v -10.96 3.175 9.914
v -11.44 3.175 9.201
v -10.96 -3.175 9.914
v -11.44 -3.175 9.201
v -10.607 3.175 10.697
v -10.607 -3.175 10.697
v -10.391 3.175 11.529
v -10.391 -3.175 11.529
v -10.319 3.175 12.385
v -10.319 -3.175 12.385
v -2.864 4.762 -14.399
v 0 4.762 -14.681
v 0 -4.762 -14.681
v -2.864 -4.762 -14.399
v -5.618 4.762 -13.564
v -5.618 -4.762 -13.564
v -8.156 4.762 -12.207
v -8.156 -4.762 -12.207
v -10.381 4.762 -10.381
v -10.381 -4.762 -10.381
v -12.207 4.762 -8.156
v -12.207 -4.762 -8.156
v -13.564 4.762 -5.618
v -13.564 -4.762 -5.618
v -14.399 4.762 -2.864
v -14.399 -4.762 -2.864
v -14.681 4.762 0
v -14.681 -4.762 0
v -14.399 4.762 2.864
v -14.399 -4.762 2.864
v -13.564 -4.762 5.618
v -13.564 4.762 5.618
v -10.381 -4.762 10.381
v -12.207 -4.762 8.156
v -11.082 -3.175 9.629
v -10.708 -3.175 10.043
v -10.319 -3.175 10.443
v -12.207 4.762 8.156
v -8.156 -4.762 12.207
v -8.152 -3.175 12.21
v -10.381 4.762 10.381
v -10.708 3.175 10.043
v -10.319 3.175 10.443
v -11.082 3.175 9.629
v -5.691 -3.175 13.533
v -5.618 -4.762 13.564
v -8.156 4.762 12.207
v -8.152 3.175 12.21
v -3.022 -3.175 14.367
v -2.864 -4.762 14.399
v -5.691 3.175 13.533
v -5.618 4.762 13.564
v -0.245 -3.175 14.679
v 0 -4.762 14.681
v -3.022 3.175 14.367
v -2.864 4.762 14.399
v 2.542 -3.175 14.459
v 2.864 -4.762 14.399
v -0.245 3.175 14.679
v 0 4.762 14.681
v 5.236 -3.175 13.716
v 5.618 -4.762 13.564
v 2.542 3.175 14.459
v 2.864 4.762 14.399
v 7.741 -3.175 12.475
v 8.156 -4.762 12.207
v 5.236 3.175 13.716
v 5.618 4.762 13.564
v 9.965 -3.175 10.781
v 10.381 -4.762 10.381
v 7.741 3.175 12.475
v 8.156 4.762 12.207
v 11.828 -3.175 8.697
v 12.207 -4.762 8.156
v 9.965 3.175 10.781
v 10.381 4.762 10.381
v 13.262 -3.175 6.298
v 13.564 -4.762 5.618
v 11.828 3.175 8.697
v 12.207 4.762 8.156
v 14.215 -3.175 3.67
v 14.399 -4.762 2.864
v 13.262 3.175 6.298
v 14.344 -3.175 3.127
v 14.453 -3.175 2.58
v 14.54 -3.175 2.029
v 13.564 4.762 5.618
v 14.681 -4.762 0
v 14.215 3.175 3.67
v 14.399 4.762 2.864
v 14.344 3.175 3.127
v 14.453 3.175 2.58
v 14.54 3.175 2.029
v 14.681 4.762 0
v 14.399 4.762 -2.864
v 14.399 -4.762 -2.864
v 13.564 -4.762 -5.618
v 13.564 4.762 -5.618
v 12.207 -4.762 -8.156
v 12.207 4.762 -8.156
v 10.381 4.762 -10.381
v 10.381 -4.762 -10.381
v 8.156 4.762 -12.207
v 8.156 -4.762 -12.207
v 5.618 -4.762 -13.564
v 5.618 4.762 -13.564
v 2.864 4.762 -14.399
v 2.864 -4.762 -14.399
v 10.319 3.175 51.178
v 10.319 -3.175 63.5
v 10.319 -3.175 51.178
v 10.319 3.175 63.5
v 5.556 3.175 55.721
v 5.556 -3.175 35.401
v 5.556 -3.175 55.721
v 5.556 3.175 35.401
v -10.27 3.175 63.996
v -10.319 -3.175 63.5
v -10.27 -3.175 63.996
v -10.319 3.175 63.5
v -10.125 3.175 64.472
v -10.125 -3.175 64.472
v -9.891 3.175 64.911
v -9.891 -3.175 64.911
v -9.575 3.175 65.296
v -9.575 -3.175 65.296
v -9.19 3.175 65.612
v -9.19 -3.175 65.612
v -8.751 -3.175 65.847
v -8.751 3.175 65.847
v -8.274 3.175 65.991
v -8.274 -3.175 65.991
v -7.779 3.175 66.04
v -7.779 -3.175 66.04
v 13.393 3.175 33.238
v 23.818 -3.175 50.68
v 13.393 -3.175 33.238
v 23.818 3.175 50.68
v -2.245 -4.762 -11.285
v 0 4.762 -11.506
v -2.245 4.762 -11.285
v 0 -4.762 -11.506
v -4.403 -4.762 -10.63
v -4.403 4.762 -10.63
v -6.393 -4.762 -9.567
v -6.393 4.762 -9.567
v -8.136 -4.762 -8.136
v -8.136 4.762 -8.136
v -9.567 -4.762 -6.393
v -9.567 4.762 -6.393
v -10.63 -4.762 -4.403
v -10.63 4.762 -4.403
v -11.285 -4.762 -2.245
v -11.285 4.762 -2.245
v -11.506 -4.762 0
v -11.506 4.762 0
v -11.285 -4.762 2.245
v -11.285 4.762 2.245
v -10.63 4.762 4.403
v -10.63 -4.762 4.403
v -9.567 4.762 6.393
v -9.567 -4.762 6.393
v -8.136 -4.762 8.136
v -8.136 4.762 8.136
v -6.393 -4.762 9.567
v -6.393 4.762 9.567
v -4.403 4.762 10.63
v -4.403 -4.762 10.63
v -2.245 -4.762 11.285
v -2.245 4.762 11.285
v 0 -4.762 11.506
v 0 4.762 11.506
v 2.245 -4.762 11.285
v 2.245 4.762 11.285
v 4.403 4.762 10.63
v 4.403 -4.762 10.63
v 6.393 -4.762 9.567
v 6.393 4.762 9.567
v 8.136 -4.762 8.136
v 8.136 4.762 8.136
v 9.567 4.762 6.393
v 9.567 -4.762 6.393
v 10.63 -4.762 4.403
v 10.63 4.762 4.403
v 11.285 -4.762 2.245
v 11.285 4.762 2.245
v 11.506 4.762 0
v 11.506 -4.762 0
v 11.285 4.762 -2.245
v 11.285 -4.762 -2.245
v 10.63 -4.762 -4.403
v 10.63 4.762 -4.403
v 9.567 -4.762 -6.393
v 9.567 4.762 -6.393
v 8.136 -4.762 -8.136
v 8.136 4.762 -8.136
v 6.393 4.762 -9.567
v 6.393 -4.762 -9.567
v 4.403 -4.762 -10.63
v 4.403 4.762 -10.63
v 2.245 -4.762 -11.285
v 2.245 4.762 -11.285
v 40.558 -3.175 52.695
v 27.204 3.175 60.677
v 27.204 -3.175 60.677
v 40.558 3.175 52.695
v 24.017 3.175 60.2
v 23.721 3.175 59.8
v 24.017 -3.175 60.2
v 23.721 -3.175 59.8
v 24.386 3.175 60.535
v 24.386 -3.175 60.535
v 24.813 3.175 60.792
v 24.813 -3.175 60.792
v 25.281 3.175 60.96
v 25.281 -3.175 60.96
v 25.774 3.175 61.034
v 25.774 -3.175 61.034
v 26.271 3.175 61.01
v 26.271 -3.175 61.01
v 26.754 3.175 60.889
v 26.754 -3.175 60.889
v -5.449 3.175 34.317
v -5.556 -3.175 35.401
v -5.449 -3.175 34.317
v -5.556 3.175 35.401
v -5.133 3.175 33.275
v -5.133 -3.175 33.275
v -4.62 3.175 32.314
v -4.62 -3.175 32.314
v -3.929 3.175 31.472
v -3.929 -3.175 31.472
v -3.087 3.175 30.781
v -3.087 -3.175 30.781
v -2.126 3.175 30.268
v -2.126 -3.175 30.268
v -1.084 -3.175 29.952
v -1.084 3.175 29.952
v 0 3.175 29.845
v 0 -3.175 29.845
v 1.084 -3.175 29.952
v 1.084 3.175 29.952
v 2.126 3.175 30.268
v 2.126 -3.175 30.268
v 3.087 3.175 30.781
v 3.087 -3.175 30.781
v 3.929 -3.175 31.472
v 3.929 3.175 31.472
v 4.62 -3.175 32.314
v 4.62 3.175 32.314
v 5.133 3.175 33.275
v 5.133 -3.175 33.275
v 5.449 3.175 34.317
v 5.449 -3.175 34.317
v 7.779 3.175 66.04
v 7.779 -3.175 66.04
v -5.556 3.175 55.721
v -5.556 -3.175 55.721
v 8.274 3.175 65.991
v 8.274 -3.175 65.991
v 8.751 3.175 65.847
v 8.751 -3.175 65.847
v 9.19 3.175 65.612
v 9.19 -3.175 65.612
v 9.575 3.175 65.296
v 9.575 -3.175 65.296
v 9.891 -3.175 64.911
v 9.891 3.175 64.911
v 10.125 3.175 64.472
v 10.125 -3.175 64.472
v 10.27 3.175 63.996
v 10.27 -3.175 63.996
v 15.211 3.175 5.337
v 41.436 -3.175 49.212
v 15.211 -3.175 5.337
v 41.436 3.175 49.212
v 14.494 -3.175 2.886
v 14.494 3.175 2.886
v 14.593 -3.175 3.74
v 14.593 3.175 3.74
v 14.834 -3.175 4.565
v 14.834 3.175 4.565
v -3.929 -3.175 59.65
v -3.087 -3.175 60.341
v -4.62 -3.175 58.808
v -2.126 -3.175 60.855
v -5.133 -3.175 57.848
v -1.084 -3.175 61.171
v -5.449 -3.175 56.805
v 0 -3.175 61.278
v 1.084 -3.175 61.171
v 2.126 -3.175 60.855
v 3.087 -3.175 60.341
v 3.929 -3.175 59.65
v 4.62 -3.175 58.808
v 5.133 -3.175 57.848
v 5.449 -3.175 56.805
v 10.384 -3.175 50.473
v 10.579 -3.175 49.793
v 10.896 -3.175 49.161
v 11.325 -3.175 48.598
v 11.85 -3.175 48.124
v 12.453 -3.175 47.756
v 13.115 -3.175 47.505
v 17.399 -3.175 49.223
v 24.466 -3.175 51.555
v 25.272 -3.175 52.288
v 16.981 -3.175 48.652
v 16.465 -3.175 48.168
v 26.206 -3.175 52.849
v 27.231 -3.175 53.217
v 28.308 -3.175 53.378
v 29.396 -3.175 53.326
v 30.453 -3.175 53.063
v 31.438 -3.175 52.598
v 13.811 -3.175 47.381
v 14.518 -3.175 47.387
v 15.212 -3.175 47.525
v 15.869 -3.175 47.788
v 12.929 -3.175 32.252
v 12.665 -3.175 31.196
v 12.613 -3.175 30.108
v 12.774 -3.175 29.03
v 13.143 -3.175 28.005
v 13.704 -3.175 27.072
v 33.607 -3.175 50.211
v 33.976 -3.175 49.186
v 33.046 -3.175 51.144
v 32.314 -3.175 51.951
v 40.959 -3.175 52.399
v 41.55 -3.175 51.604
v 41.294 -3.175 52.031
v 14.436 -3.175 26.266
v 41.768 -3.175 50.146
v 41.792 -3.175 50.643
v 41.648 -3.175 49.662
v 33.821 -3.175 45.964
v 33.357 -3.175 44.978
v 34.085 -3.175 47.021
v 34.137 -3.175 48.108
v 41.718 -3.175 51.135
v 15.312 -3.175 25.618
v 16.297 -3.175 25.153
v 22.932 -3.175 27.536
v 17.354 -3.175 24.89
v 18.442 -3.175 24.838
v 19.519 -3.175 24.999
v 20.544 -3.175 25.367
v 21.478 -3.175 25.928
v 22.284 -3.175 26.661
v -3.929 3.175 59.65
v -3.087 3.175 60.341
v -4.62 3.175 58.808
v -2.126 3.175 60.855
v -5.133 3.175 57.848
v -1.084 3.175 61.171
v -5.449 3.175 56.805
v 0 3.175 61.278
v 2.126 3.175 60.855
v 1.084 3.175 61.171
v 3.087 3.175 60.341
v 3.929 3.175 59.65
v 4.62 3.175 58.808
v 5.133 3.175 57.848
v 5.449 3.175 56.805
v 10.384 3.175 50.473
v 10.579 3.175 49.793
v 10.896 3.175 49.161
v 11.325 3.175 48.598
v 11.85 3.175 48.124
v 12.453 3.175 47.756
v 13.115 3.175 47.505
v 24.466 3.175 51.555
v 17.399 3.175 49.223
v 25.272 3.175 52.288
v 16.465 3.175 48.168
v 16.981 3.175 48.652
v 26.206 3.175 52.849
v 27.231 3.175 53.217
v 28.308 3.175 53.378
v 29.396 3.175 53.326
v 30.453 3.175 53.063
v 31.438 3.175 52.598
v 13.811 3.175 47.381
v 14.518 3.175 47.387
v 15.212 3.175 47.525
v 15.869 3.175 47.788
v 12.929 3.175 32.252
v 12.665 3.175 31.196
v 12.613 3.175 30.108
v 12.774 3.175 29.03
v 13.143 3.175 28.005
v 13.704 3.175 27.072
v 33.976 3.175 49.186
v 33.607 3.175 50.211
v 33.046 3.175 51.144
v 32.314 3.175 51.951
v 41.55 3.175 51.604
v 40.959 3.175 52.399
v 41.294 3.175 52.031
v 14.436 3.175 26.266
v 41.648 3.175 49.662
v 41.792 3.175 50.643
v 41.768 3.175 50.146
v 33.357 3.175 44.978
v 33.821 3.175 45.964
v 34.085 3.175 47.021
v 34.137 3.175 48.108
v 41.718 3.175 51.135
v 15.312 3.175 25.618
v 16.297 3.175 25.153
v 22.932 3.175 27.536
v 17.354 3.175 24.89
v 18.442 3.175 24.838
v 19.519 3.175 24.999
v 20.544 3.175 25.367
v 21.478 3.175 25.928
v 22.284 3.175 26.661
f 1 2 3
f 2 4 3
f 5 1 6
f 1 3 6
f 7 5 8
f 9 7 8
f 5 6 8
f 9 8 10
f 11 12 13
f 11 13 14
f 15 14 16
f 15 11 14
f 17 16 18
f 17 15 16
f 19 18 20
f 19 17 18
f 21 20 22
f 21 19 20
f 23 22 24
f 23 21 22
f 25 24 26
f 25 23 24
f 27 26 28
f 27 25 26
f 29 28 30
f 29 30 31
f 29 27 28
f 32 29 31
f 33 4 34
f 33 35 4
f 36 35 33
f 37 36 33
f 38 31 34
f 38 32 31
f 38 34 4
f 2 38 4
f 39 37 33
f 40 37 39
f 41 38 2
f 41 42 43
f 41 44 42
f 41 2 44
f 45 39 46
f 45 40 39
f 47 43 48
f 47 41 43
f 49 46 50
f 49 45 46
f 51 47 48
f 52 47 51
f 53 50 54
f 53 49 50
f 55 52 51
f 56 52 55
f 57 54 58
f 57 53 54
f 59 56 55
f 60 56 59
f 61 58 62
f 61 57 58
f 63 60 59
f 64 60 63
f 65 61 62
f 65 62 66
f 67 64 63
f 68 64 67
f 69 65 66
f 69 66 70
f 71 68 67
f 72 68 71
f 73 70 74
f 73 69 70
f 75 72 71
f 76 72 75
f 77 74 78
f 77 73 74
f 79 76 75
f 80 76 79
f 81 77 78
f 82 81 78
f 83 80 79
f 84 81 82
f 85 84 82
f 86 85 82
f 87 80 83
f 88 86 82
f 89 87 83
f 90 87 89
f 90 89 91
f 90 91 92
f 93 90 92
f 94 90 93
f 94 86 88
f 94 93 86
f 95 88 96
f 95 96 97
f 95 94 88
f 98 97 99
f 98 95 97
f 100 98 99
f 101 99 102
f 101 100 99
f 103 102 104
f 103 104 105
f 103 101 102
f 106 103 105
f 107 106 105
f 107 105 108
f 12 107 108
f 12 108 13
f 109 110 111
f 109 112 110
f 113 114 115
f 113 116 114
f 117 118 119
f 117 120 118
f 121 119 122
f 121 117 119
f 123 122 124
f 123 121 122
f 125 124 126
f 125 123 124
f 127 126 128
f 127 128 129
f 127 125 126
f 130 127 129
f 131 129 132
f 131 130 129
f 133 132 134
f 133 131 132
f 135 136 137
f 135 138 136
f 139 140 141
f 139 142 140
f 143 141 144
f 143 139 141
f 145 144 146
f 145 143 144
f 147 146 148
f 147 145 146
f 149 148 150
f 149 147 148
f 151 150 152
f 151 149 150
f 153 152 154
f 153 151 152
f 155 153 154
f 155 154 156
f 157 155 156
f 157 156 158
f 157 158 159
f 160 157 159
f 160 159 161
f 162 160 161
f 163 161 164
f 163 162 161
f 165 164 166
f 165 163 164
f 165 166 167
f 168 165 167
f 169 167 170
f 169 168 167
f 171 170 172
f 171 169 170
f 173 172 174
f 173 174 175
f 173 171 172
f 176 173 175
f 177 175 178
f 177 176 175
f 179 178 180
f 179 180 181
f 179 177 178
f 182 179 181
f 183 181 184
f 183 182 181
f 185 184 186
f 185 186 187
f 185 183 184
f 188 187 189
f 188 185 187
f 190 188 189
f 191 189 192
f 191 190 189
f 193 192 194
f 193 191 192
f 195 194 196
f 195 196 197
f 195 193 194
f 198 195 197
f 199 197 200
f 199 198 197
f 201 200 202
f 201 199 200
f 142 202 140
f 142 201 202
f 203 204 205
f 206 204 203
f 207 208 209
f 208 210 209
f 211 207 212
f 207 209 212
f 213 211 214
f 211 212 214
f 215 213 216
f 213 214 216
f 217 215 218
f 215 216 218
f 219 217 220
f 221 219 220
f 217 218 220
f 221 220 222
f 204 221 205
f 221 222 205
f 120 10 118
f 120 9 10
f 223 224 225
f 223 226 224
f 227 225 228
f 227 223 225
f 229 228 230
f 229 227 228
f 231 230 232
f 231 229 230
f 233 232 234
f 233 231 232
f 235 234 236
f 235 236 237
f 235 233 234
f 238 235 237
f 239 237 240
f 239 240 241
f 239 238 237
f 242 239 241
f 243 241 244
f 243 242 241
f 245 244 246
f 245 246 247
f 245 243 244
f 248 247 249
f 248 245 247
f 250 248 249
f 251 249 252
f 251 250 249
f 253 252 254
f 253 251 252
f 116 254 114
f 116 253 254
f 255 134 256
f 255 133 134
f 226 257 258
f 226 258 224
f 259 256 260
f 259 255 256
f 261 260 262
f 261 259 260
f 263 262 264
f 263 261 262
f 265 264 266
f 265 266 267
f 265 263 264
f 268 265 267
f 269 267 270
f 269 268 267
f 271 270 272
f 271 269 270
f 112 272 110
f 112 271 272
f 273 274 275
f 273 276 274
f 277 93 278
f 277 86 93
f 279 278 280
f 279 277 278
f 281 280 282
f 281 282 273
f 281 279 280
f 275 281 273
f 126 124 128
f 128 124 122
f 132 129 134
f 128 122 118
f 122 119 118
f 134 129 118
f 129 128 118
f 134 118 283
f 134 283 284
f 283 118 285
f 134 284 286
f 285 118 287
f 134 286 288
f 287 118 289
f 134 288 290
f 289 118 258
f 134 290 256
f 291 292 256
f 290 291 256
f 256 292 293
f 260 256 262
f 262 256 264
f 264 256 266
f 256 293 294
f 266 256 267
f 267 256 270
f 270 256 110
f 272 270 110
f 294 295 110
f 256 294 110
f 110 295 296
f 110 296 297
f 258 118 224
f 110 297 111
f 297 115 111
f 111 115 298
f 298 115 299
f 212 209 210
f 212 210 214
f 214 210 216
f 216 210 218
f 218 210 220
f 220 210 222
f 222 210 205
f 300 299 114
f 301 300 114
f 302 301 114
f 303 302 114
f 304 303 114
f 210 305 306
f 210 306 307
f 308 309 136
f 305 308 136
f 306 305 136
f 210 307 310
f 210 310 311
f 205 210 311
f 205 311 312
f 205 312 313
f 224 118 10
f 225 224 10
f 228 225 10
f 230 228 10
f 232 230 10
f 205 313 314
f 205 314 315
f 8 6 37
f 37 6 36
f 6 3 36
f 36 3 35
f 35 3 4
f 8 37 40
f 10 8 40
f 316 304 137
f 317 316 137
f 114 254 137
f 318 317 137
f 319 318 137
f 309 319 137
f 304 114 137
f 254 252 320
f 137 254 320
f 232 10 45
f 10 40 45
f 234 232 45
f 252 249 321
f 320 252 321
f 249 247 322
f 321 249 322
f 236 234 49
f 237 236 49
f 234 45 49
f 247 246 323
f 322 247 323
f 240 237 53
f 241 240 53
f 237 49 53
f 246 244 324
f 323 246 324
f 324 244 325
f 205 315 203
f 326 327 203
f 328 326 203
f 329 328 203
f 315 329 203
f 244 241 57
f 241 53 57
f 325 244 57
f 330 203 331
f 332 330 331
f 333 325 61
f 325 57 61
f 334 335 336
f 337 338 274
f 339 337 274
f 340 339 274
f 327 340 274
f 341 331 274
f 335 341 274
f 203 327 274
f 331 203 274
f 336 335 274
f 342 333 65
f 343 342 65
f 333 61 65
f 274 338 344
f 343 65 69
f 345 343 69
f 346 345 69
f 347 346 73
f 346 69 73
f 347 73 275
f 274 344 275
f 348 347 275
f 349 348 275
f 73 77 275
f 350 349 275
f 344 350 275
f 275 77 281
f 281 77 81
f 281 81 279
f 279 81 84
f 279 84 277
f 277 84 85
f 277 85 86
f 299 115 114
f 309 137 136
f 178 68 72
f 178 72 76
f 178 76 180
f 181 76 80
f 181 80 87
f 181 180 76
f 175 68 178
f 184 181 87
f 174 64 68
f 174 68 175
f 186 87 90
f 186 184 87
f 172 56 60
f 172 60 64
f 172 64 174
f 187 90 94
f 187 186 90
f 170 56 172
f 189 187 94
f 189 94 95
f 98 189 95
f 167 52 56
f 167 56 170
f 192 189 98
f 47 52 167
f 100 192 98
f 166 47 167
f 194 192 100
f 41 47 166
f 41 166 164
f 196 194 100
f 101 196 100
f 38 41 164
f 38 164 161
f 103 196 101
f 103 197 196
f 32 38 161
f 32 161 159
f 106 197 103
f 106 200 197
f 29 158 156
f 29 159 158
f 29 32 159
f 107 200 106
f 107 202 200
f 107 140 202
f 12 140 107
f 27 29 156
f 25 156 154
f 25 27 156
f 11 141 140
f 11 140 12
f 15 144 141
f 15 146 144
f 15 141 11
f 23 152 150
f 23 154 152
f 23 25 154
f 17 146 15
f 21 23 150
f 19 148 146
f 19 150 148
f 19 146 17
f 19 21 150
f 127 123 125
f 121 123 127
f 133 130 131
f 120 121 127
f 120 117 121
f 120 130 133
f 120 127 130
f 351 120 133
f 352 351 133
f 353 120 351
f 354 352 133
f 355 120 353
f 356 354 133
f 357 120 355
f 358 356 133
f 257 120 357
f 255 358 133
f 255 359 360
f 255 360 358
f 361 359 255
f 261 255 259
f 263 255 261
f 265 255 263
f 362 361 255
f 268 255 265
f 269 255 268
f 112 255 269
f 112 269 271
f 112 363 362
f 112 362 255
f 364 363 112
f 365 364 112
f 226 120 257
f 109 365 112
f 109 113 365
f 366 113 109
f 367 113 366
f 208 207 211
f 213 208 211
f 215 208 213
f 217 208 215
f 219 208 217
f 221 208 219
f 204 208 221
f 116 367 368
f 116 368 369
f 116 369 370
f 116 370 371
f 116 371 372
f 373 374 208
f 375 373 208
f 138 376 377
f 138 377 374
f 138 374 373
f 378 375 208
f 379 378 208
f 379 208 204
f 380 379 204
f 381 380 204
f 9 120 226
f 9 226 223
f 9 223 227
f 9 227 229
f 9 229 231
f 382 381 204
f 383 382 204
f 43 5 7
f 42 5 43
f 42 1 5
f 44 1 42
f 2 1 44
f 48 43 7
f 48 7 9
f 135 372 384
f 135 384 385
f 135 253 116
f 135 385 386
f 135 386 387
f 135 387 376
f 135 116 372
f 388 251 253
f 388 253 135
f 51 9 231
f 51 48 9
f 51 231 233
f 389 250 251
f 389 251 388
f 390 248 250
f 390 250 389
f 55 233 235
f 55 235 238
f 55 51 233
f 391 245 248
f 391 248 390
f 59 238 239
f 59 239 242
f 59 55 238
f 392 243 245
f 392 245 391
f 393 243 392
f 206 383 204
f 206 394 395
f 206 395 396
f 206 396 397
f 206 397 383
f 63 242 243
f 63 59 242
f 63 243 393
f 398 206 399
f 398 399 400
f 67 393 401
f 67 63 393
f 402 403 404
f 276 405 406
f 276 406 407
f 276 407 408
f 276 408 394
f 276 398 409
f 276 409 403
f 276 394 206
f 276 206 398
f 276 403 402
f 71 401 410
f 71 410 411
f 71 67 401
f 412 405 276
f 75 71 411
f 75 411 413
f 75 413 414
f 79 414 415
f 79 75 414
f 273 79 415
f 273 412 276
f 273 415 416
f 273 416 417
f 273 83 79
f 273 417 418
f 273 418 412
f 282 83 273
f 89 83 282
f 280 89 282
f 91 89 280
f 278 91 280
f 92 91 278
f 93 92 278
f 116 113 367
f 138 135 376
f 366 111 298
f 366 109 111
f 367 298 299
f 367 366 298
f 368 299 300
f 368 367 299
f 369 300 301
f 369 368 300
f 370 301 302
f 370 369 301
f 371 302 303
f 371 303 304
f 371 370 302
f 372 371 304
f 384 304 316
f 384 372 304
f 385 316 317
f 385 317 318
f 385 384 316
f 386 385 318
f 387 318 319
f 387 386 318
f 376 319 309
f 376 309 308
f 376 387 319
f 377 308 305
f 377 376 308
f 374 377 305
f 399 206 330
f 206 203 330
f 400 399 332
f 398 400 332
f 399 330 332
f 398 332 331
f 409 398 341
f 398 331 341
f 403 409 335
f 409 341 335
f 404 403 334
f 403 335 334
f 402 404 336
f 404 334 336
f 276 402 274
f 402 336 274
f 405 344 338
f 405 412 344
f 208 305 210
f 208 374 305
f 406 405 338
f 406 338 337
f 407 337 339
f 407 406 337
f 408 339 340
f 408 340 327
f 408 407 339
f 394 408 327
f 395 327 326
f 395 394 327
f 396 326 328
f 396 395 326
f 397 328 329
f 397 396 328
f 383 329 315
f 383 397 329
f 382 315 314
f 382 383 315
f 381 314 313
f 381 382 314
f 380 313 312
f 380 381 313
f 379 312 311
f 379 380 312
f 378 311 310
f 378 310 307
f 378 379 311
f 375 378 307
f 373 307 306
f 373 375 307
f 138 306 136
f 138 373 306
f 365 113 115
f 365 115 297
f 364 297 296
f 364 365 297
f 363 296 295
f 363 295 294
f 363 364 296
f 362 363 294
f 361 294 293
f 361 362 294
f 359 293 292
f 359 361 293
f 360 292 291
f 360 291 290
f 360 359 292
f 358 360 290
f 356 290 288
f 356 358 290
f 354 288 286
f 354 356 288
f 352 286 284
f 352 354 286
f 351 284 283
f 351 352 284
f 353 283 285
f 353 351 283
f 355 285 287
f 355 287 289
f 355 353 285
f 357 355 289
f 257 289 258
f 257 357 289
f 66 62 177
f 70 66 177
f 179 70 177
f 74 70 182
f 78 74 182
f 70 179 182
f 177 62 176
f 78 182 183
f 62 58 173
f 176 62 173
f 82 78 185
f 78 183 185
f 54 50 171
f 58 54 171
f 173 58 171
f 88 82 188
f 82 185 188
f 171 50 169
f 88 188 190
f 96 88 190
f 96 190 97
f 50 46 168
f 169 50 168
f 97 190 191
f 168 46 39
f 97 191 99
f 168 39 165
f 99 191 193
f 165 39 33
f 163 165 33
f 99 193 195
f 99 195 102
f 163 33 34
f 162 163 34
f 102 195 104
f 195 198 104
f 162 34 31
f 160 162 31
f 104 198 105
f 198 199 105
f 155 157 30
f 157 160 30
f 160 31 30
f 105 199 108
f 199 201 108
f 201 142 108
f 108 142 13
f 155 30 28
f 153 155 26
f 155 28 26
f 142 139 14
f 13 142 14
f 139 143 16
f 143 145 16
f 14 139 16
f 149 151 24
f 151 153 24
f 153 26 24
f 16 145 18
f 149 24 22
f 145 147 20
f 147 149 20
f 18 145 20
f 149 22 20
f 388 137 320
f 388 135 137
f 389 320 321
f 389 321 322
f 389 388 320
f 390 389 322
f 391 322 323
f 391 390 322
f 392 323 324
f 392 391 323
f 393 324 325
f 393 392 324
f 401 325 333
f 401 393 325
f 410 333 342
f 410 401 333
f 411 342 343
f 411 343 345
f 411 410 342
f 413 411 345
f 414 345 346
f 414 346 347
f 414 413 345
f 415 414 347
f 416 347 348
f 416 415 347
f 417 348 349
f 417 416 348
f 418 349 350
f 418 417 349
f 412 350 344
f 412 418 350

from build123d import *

# Parameters (mm, degrees)
SKETCH1_R                      = 14.6812
SKETCH1_R_2                    = 11.5062
BEARING_INSERT_EXTRUDE_DEPTH   = 4.7625
APEX_SLOT_INSERT_EXTRUDE_DEPTH = 3.175
FILLET1_R                      = 5.08
FILLET2_R                      = 2.54
FILLET3_R                      = 3.81


with BuildPart() as part:
    # Sketch1 → Bearing_Insert_Extrude (new, symmetric)
    with BuildSketch(Plane(origin=(0, 0, 0), x_dir=(1, 0, 0), z_dir=(0, 1, 0))):
        with Locations(Location((0, 0, 0), (0, 0, 90))):
            Circle(SKETCH1_R)
        with Locations(Location((0, 0, 0), (0, 0, 90))):
            Circle(SKETCH1_R_2, mode=Mode.SUBTRACT)
    extrude(amount=BEARING_INSERT_EXTRUDE_DEPTH, both=True)

    # Sketch1<4> → Apex_Slot_Insert_Extrude (add, symmetric)
    # profile 1 of 2: a face of its own
    with BuildSketch(Plane(origin=(0, 0, 0), x_dir=(1, 0, 0), z_dir=(0, 1, 0))):
        with BuildLine():
            Line((-10.31875, -10.443228997), (-10.31875, -66.04))
            Line((-10.31875, -66.04), (10.31875, -66.04))
            Line((10.31875, -66.04), (10.31875, -37.376828003))
            Line((10.31875, -37.376828003), (25.024230745, -61.980207141))
            Line((25.024230745, -61.980207141), (42.738677597, -51.392252712))
            Line((42.738677597, -51.392252712), (14.215063896, -3.670094259))
            ThreePointArc((14.215063896, -3.670094259), (3.906936657, -14.151801278), (-10.31875, -10.443228997))
        make_face()
        with BuildLine():
            ThreePointArc((5.55625, -55.72125), (0, -61.2775), (-5.55625, -55.72125))
            Line((-5.55625, -55.72125), (-5.55625, -35.40125))
            ThreePointArc((-5.55625, -35.40125), (0, -29.845), (5.55625, -35.40125))
            Line((5.55625, -35.40125), (5.55625, -55.72125))
        make_face(mode=Mode.SUBTRACT)
        with BuildLine():
            ThreePointArc((33.356751109, -44.978403385), (31.438080072, -52.598280653), (23.818202804, -50.679609616))
            Line((23.818202804, -50.679609616), (13.393139982, -33.237692715))
            ThreePointArc((13.393139982, -33.237692715), (15.31181102, -25.617815447), (22.931688287, -27.536486485))
            Line((22.931688287, -27.536486485), (33.356751109, -44.978403385))
        make_face(mode=Mode.SUBTRACT)
    # profile 2 of 2: a face of its own
    with BuildSketch(Plane(origin=(0, 0, 0), x_dir=(1, 0, 0), z_dir=(0, 1, 0))):
        with BuildLine():
            Line((-10.31875, -10.443228997), (-10.31875, -66.04))
            Line((-10.31875, -66.04), (10.31875, -66.04))
            Line((10.31875, -66.04), (10.31875, -37.376828003))
            Line((10.31875, -37.376828003), (25.024230745, -61.980207141))
            Line((25.024230745, -61.980207141), (42.738677597, -51.392252712))
            Line((42.738677597, -51.392252712), (14.215063896, -3.670094259))
            ThreePointArc((14.215063896, -3.670094259), (3.906936657, -14.151801278), (-10.31875, -10.443228997))
        make_face()
        with BuildLine():
            ThreePointArc((5.55625, -55.72125), (0, -61.2775), (-5.55625, -55.72125))
            Line((-5.55625, -55.72125), (-5.55625, -35.40125))
            ThreePointArc((-5.55625, -35.40125), (0, -29.845), (5.55625, -35.40125))
            Line((5.55625, -35.40125), (5.55625, -55.72125))
        make_face(mode=Mode.SUBTRACT)
        with BuildLine():
            ThreePointArc((33.356751109, -44.978403385), (31.438080072, -52.598280653), (23.818202804, -50.679609616))
            Line((23.818202804, -50.679609616), (13.393139982, -33.237692715))
            ThreePointArc((13.393139982, -33.237692715), (15.31181102, -25.617815447), (22.931688287, -27.536486485))
            Line((22.931688287, -27.536486485), (33.356751109, -44.978403385))
        make_face(mode=Mode.SUBTRACT)
    extrude(amount=APEX_SLOT_INSERT_EXTRUDE_DEPTH, both=True)

    # Fillet1
    fillet1_edges = [part.edges().sort_by_distance(p)[0] for p in [
        (14.215063896, 0, 3.670094259),
        (-10.31875, 0, 10.443228997),
    ]]
    fillet(fillet1_edges, radius=FILLET1_R)

    # Fillet2
    fillet2_edges = [part.edges().sort_by_distance(p)[0] for p in [
        (-10.31875, 0, 66.04),
        (10.31875, 0, 66.04),
        (25.024230745, 0, 61.980207141),
        (42.738677597, 0, 51.392252712),
    ]]
    fillet(fillet2_edges, radius=FILLET2_R)

    # Fillet3
    fillet3_edges = [part.edges().sort_by_distance(p)[0] for p in [
        (10.31875, 0, 37.376828003),
    ]]
    fillet(fillet3_edges, radius=FILLET3_R)


solid = part.part
